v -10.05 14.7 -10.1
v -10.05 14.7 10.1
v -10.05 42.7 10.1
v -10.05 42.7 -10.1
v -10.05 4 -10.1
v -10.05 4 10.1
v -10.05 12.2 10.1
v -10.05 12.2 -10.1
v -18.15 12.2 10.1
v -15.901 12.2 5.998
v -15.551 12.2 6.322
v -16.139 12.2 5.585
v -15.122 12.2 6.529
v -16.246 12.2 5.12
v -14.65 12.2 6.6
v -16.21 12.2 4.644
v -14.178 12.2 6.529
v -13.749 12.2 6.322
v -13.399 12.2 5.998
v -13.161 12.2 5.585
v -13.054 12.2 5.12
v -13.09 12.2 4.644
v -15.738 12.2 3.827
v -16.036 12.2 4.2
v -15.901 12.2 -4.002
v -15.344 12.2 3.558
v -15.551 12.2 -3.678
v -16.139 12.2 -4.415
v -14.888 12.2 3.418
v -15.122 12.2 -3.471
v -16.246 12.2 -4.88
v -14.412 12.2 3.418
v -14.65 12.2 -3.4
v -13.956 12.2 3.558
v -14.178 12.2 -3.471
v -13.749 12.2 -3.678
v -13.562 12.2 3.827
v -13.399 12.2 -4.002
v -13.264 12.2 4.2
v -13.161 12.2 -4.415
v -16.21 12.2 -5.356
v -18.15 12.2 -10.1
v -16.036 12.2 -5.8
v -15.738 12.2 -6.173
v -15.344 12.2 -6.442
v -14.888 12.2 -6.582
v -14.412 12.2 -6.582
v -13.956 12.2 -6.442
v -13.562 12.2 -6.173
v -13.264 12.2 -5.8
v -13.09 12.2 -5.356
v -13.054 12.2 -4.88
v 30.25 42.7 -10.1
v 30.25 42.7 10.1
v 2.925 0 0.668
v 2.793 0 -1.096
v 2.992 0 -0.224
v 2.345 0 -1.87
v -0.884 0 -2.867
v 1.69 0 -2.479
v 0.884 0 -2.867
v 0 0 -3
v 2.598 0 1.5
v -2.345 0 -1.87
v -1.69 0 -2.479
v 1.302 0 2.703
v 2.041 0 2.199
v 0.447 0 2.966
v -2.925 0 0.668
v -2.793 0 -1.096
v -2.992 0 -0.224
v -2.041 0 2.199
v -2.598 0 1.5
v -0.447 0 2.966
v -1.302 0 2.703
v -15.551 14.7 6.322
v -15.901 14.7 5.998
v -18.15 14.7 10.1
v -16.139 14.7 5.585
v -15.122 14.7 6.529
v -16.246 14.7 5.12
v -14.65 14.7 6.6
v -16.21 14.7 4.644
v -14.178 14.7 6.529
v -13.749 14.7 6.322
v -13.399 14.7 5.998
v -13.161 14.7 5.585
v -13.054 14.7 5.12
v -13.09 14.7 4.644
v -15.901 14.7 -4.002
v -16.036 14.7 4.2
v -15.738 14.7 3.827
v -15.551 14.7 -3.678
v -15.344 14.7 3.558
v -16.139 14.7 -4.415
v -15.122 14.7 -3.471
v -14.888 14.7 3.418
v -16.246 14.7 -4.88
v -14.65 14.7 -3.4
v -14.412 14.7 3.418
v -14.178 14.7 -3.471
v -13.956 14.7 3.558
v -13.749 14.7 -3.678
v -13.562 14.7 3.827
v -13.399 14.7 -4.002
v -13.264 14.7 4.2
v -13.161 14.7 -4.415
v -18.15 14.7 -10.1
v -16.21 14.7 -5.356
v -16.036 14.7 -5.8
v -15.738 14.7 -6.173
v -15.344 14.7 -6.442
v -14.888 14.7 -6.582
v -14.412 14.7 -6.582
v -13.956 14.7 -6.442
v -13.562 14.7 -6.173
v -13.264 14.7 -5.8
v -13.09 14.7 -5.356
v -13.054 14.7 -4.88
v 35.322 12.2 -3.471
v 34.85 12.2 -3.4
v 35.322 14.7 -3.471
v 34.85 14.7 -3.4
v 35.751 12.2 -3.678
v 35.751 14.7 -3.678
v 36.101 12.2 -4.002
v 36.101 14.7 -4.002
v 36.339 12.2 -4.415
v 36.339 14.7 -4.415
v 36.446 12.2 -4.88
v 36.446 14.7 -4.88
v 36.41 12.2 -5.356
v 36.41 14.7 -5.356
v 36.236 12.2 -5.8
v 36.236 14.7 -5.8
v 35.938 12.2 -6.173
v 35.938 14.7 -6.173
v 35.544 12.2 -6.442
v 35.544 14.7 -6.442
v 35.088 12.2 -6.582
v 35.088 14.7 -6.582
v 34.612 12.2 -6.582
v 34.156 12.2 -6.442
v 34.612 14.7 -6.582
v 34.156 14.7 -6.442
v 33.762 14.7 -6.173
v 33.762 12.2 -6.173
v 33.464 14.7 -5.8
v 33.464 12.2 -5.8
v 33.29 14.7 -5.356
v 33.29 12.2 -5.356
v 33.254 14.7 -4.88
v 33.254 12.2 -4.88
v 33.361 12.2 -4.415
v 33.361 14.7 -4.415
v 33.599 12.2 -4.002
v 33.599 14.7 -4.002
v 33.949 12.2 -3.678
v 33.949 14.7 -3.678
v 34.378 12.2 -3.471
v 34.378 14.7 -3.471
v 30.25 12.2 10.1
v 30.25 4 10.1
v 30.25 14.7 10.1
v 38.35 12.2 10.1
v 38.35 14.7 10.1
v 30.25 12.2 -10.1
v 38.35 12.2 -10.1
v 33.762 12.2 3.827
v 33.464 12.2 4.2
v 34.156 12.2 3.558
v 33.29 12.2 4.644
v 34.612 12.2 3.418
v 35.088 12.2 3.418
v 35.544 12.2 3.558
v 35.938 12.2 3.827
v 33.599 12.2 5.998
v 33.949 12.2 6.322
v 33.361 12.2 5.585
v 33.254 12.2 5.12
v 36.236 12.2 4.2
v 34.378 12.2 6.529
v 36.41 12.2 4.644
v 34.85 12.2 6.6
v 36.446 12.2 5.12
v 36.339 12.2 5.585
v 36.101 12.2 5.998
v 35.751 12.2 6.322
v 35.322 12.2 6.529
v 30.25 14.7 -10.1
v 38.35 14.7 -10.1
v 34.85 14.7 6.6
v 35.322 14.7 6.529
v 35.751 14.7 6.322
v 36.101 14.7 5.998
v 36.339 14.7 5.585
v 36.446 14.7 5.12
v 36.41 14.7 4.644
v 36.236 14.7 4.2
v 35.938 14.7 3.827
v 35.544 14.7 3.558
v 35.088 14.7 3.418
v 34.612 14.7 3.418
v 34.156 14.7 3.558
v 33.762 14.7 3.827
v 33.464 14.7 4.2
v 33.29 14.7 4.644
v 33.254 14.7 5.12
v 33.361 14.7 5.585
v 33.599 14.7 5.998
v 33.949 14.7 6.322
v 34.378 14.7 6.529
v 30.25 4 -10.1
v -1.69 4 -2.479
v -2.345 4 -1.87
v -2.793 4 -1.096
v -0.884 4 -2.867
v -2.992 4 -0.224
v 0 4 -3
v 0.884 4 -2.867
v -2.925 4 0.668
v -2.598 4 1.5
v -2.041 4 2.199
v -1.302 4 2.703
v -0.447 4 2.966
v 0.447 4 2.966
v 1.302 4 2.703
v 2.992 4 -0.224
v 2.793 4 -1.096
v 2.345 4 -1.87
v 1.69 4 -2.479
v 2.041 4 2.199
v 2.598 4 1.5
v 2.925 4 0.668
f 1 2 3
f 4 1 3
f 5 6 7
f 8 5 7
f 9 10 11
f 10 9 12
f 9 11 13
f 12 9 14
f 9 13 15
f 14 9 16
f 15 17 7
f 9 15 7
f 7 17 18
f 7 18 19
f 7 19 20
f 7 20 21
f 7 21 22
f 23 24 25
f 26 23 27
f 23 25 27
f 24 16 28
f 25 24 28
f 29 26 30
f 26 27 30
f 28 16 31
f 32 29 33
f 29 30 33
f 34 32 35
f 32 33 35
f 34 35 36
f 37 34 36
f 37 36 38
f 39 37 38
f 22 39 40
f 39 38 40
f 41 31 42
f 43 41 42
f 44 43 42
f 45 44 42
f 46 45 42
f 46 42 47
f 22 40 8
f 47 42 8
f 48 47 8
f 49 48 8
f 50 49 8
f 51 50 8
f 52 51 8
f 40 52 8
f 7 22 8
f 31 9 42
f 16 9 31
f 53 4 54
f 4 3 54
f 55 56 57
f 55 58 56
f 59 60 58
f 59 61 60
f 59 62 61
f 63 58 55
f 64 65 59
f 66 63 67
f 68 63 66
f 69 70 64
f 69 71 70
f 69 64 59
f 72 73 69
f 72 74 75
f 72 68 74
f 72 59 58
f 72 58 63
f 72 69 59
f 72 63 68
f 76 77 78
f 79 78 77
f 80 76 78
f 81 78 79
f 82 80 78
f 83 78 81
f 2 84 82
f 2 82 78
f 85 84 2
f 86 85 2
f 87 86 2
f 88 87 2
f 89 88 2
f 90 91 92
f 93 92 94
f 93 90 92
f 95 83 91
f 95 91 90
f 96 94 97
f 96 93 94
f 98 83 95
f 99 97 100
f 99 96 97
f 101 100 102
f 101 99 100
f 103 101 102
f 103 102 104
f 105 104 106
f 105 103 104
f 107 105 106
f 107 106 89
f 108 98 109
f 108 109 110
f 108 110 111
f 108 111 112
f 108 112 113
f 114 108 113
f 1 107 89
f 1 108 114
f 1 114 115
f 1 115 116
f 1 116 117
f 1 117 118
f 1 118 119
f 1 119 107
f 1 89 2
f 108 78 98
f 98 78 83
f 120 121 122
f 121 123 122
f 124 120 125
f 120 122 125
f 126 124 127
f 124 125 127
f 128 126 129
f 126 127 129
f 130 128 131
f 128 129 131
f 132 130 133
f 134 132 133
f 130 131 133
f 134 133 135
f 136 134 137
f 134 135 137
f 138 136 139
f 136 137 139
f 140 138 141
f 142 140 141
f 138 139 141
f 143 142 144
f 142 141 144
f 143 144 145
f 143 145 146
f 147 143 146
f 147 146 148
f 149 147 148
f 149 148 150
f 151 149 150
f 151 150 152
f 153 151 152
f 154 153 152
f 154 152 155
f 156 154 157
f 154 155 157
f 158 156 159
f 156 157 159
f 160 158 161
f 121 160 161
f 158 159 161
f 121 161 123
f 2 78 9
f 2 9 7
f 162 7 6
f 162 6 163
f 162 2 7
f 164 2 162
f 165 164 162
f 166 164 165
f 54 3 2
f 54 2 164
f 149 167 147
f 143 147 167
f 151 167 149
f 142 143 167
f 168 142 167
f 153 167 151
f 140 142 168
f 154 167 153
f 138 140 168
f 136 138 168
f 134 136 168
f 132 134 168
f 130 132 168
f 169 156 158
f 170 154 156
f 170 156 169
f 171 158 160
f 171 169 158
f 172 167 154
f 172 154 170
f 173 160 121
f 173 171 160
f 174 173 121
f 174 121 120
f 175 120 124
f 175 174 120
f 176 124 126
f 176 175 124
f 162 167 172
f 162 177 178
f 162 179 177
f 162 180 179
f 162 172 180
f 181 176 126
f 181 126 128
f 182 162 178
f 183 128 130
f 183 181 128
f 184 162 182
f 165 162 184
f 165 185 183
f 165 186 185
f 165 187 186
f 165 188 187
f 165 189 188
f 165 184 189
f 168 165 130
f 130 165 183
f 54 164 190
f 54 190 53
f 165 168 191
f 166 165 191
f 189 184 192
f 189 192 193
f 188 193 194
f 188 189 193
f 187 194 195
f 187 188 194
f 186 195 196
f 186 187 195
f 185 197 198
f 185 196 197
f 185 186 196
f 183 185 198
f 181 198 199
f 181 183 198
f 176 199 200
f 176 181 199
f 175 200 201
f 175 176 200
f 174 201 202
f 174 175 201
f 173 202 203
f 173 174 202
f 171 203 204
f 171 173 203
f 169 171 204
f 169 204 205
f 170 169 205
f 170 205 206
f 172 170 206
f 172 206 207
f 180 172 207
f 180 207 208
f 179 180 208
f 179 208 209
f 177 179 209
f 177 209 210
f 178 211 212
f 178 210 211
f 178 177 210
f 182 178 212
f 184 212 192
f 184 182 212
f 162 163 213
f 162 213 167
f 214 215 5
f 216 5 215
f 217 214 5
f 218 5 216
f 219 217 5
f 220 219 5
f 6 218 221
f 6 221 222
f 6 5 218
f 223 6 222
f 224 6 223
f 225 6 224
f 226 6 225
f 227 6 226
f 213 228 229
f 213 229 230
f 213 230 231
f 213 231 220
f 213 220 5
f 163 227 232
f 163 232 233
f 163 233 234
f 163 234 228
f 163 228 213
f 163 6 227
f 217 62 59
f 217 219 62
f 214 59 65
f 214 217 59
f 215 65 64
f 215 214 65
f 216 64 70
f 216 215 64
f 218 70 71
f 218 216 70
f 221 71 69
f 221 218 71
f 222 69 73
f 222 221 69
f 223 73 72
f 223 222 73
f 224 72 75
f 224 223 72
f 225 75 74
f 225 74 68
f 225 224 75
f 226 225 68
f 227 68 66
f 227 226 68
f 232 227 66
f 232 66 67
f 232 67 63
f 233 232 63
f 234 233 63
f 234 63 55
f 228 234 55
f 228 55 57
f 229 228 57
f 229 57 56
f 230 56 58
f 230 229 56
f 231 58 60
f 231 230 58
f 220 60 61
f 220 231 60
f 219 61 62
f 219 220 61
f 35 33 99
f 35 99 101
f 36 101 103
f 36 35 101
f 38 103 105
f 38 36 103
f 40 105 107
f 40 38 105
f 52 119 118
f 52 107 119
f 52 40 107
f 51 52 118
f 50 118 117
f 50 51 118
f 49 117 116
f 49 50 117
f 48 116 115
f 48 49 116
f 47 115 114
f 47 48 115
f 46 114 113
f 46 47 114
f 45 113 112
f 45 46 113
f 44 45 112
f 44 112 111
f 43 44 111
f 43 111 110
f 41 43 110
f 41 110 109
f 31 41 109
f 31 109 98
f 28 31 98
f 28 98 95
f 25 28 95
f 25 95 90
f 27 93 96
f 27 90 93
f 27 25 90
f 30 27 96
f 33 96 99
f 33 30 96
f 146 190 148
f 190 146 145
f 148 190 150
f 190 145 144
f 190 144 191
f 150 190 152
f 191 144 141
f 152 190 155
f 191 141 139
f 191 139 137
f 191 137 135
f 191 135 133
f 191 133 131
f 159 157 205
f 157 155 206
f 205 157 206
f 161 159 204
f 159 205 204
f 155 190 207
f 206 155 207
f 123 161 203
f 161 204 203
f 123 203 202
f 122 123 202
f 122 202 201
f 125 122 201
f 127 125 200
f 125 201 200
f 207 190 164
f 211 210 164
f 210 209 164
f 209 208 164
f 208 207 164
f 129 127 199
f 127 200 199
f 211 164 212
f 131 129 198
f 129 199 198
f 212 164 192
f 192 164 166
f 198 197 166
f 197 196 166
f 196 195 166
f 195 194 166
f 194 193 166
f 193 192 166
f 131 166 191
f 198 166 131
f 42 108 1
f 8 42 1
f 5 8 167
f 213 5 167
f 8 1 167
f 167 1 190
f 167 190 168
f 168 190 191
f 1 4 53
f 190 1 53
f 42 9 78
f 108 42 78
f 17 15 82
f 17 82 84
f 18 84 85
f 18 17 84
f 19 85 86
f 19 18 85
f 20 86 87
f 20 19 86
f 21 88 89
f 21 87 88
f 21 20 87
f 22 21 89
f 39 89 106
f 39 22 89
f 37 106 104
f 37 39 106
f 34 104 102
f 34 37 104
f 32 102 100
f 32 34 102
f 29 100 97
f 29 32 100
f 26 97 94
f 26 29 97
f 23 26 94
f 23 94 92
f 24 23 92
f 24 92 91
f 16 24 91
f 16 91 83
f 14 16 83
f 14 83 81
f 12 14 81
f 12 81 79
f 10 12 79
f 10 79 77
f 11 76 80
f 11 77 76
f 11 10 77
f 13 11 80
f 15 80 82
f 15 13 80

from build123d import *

# Parameters (mm, degrees)
CASE_SKETCH_W      = 40.3
CASE_SKETCH_H      = 38.7
CASE_2_DEPTH       = 10.1
TABS_SKETCH_W      = 8.1
TABS_SKETCH_H      = 2.5
TABS_DEPTH         = 10.1
SHAFT_SKETCH_W     = 3
SHAFT_SKETCH_H     = 4
TAB_HOLES_SKETCH_R = 1.6
TAB_HOLES_DEPTH    = 52.7


with BuildPart() as part:
    # Case Sketch → Case 2 (new, symmetric)
    with BuildSketch(Plane.XY):
        with Locations((10.1, 23.35)):
            Rectangle(CASE_SKETCH_W, CASE_SKETCH_H)
    extrude(amount=CASE_2_DEPTH, both=True)

    # Tabs Sketch → Tabs (add, symmetric)
    with BuildSketch(Plane.XY):
        with Locations((-14.1, 13.45)):
            Rectangle(TABS_SKETCH_W, TABS_SKETCH_H)
        with Locations((34.3, 13.45)):
            Rectangle(TABS_SKETCH_W, TABS_SKETCH_H)
    extrude(amount=TABS_DEPTH, both=True)

    # Shaft Sketch → Shaft (revolve)
    with BuildSketch(Plane.XY):
        with Locations((1.5, 2)):
            Rectangle(SHAFT_SKETCH_W, SHAFT_SKETCH_H)
    revolve(axis=Axis((0, -500, 0), (0, 1, 0)))

    # Tab Holes Sketch → Tab Holes (cut, symmetric)
    with BuildSketch(Plane(origin=(0, 0, 0), x_dir=(1, 0, 0), z_dir=(0, 1, 0))):
        with Locations((-14.65, -5)):
            Circle(TAB_HOLES_SKETCH_R)
        with Locations((-14.65, 5)):
            Circle(TAB_HOLES_SKETCH_R)
        with Locations((34.85, -5)):
            Circle(TAB_HOLES_SKETCH_R)
        with Locations((34.85, 5)):
            Circle(TAB_HOLES_SKETCH_R)
    extrude(amount=TAB_HOLES_DEPTH, both=True, mode=Mode.SUBTRACT)


solid = part.part
